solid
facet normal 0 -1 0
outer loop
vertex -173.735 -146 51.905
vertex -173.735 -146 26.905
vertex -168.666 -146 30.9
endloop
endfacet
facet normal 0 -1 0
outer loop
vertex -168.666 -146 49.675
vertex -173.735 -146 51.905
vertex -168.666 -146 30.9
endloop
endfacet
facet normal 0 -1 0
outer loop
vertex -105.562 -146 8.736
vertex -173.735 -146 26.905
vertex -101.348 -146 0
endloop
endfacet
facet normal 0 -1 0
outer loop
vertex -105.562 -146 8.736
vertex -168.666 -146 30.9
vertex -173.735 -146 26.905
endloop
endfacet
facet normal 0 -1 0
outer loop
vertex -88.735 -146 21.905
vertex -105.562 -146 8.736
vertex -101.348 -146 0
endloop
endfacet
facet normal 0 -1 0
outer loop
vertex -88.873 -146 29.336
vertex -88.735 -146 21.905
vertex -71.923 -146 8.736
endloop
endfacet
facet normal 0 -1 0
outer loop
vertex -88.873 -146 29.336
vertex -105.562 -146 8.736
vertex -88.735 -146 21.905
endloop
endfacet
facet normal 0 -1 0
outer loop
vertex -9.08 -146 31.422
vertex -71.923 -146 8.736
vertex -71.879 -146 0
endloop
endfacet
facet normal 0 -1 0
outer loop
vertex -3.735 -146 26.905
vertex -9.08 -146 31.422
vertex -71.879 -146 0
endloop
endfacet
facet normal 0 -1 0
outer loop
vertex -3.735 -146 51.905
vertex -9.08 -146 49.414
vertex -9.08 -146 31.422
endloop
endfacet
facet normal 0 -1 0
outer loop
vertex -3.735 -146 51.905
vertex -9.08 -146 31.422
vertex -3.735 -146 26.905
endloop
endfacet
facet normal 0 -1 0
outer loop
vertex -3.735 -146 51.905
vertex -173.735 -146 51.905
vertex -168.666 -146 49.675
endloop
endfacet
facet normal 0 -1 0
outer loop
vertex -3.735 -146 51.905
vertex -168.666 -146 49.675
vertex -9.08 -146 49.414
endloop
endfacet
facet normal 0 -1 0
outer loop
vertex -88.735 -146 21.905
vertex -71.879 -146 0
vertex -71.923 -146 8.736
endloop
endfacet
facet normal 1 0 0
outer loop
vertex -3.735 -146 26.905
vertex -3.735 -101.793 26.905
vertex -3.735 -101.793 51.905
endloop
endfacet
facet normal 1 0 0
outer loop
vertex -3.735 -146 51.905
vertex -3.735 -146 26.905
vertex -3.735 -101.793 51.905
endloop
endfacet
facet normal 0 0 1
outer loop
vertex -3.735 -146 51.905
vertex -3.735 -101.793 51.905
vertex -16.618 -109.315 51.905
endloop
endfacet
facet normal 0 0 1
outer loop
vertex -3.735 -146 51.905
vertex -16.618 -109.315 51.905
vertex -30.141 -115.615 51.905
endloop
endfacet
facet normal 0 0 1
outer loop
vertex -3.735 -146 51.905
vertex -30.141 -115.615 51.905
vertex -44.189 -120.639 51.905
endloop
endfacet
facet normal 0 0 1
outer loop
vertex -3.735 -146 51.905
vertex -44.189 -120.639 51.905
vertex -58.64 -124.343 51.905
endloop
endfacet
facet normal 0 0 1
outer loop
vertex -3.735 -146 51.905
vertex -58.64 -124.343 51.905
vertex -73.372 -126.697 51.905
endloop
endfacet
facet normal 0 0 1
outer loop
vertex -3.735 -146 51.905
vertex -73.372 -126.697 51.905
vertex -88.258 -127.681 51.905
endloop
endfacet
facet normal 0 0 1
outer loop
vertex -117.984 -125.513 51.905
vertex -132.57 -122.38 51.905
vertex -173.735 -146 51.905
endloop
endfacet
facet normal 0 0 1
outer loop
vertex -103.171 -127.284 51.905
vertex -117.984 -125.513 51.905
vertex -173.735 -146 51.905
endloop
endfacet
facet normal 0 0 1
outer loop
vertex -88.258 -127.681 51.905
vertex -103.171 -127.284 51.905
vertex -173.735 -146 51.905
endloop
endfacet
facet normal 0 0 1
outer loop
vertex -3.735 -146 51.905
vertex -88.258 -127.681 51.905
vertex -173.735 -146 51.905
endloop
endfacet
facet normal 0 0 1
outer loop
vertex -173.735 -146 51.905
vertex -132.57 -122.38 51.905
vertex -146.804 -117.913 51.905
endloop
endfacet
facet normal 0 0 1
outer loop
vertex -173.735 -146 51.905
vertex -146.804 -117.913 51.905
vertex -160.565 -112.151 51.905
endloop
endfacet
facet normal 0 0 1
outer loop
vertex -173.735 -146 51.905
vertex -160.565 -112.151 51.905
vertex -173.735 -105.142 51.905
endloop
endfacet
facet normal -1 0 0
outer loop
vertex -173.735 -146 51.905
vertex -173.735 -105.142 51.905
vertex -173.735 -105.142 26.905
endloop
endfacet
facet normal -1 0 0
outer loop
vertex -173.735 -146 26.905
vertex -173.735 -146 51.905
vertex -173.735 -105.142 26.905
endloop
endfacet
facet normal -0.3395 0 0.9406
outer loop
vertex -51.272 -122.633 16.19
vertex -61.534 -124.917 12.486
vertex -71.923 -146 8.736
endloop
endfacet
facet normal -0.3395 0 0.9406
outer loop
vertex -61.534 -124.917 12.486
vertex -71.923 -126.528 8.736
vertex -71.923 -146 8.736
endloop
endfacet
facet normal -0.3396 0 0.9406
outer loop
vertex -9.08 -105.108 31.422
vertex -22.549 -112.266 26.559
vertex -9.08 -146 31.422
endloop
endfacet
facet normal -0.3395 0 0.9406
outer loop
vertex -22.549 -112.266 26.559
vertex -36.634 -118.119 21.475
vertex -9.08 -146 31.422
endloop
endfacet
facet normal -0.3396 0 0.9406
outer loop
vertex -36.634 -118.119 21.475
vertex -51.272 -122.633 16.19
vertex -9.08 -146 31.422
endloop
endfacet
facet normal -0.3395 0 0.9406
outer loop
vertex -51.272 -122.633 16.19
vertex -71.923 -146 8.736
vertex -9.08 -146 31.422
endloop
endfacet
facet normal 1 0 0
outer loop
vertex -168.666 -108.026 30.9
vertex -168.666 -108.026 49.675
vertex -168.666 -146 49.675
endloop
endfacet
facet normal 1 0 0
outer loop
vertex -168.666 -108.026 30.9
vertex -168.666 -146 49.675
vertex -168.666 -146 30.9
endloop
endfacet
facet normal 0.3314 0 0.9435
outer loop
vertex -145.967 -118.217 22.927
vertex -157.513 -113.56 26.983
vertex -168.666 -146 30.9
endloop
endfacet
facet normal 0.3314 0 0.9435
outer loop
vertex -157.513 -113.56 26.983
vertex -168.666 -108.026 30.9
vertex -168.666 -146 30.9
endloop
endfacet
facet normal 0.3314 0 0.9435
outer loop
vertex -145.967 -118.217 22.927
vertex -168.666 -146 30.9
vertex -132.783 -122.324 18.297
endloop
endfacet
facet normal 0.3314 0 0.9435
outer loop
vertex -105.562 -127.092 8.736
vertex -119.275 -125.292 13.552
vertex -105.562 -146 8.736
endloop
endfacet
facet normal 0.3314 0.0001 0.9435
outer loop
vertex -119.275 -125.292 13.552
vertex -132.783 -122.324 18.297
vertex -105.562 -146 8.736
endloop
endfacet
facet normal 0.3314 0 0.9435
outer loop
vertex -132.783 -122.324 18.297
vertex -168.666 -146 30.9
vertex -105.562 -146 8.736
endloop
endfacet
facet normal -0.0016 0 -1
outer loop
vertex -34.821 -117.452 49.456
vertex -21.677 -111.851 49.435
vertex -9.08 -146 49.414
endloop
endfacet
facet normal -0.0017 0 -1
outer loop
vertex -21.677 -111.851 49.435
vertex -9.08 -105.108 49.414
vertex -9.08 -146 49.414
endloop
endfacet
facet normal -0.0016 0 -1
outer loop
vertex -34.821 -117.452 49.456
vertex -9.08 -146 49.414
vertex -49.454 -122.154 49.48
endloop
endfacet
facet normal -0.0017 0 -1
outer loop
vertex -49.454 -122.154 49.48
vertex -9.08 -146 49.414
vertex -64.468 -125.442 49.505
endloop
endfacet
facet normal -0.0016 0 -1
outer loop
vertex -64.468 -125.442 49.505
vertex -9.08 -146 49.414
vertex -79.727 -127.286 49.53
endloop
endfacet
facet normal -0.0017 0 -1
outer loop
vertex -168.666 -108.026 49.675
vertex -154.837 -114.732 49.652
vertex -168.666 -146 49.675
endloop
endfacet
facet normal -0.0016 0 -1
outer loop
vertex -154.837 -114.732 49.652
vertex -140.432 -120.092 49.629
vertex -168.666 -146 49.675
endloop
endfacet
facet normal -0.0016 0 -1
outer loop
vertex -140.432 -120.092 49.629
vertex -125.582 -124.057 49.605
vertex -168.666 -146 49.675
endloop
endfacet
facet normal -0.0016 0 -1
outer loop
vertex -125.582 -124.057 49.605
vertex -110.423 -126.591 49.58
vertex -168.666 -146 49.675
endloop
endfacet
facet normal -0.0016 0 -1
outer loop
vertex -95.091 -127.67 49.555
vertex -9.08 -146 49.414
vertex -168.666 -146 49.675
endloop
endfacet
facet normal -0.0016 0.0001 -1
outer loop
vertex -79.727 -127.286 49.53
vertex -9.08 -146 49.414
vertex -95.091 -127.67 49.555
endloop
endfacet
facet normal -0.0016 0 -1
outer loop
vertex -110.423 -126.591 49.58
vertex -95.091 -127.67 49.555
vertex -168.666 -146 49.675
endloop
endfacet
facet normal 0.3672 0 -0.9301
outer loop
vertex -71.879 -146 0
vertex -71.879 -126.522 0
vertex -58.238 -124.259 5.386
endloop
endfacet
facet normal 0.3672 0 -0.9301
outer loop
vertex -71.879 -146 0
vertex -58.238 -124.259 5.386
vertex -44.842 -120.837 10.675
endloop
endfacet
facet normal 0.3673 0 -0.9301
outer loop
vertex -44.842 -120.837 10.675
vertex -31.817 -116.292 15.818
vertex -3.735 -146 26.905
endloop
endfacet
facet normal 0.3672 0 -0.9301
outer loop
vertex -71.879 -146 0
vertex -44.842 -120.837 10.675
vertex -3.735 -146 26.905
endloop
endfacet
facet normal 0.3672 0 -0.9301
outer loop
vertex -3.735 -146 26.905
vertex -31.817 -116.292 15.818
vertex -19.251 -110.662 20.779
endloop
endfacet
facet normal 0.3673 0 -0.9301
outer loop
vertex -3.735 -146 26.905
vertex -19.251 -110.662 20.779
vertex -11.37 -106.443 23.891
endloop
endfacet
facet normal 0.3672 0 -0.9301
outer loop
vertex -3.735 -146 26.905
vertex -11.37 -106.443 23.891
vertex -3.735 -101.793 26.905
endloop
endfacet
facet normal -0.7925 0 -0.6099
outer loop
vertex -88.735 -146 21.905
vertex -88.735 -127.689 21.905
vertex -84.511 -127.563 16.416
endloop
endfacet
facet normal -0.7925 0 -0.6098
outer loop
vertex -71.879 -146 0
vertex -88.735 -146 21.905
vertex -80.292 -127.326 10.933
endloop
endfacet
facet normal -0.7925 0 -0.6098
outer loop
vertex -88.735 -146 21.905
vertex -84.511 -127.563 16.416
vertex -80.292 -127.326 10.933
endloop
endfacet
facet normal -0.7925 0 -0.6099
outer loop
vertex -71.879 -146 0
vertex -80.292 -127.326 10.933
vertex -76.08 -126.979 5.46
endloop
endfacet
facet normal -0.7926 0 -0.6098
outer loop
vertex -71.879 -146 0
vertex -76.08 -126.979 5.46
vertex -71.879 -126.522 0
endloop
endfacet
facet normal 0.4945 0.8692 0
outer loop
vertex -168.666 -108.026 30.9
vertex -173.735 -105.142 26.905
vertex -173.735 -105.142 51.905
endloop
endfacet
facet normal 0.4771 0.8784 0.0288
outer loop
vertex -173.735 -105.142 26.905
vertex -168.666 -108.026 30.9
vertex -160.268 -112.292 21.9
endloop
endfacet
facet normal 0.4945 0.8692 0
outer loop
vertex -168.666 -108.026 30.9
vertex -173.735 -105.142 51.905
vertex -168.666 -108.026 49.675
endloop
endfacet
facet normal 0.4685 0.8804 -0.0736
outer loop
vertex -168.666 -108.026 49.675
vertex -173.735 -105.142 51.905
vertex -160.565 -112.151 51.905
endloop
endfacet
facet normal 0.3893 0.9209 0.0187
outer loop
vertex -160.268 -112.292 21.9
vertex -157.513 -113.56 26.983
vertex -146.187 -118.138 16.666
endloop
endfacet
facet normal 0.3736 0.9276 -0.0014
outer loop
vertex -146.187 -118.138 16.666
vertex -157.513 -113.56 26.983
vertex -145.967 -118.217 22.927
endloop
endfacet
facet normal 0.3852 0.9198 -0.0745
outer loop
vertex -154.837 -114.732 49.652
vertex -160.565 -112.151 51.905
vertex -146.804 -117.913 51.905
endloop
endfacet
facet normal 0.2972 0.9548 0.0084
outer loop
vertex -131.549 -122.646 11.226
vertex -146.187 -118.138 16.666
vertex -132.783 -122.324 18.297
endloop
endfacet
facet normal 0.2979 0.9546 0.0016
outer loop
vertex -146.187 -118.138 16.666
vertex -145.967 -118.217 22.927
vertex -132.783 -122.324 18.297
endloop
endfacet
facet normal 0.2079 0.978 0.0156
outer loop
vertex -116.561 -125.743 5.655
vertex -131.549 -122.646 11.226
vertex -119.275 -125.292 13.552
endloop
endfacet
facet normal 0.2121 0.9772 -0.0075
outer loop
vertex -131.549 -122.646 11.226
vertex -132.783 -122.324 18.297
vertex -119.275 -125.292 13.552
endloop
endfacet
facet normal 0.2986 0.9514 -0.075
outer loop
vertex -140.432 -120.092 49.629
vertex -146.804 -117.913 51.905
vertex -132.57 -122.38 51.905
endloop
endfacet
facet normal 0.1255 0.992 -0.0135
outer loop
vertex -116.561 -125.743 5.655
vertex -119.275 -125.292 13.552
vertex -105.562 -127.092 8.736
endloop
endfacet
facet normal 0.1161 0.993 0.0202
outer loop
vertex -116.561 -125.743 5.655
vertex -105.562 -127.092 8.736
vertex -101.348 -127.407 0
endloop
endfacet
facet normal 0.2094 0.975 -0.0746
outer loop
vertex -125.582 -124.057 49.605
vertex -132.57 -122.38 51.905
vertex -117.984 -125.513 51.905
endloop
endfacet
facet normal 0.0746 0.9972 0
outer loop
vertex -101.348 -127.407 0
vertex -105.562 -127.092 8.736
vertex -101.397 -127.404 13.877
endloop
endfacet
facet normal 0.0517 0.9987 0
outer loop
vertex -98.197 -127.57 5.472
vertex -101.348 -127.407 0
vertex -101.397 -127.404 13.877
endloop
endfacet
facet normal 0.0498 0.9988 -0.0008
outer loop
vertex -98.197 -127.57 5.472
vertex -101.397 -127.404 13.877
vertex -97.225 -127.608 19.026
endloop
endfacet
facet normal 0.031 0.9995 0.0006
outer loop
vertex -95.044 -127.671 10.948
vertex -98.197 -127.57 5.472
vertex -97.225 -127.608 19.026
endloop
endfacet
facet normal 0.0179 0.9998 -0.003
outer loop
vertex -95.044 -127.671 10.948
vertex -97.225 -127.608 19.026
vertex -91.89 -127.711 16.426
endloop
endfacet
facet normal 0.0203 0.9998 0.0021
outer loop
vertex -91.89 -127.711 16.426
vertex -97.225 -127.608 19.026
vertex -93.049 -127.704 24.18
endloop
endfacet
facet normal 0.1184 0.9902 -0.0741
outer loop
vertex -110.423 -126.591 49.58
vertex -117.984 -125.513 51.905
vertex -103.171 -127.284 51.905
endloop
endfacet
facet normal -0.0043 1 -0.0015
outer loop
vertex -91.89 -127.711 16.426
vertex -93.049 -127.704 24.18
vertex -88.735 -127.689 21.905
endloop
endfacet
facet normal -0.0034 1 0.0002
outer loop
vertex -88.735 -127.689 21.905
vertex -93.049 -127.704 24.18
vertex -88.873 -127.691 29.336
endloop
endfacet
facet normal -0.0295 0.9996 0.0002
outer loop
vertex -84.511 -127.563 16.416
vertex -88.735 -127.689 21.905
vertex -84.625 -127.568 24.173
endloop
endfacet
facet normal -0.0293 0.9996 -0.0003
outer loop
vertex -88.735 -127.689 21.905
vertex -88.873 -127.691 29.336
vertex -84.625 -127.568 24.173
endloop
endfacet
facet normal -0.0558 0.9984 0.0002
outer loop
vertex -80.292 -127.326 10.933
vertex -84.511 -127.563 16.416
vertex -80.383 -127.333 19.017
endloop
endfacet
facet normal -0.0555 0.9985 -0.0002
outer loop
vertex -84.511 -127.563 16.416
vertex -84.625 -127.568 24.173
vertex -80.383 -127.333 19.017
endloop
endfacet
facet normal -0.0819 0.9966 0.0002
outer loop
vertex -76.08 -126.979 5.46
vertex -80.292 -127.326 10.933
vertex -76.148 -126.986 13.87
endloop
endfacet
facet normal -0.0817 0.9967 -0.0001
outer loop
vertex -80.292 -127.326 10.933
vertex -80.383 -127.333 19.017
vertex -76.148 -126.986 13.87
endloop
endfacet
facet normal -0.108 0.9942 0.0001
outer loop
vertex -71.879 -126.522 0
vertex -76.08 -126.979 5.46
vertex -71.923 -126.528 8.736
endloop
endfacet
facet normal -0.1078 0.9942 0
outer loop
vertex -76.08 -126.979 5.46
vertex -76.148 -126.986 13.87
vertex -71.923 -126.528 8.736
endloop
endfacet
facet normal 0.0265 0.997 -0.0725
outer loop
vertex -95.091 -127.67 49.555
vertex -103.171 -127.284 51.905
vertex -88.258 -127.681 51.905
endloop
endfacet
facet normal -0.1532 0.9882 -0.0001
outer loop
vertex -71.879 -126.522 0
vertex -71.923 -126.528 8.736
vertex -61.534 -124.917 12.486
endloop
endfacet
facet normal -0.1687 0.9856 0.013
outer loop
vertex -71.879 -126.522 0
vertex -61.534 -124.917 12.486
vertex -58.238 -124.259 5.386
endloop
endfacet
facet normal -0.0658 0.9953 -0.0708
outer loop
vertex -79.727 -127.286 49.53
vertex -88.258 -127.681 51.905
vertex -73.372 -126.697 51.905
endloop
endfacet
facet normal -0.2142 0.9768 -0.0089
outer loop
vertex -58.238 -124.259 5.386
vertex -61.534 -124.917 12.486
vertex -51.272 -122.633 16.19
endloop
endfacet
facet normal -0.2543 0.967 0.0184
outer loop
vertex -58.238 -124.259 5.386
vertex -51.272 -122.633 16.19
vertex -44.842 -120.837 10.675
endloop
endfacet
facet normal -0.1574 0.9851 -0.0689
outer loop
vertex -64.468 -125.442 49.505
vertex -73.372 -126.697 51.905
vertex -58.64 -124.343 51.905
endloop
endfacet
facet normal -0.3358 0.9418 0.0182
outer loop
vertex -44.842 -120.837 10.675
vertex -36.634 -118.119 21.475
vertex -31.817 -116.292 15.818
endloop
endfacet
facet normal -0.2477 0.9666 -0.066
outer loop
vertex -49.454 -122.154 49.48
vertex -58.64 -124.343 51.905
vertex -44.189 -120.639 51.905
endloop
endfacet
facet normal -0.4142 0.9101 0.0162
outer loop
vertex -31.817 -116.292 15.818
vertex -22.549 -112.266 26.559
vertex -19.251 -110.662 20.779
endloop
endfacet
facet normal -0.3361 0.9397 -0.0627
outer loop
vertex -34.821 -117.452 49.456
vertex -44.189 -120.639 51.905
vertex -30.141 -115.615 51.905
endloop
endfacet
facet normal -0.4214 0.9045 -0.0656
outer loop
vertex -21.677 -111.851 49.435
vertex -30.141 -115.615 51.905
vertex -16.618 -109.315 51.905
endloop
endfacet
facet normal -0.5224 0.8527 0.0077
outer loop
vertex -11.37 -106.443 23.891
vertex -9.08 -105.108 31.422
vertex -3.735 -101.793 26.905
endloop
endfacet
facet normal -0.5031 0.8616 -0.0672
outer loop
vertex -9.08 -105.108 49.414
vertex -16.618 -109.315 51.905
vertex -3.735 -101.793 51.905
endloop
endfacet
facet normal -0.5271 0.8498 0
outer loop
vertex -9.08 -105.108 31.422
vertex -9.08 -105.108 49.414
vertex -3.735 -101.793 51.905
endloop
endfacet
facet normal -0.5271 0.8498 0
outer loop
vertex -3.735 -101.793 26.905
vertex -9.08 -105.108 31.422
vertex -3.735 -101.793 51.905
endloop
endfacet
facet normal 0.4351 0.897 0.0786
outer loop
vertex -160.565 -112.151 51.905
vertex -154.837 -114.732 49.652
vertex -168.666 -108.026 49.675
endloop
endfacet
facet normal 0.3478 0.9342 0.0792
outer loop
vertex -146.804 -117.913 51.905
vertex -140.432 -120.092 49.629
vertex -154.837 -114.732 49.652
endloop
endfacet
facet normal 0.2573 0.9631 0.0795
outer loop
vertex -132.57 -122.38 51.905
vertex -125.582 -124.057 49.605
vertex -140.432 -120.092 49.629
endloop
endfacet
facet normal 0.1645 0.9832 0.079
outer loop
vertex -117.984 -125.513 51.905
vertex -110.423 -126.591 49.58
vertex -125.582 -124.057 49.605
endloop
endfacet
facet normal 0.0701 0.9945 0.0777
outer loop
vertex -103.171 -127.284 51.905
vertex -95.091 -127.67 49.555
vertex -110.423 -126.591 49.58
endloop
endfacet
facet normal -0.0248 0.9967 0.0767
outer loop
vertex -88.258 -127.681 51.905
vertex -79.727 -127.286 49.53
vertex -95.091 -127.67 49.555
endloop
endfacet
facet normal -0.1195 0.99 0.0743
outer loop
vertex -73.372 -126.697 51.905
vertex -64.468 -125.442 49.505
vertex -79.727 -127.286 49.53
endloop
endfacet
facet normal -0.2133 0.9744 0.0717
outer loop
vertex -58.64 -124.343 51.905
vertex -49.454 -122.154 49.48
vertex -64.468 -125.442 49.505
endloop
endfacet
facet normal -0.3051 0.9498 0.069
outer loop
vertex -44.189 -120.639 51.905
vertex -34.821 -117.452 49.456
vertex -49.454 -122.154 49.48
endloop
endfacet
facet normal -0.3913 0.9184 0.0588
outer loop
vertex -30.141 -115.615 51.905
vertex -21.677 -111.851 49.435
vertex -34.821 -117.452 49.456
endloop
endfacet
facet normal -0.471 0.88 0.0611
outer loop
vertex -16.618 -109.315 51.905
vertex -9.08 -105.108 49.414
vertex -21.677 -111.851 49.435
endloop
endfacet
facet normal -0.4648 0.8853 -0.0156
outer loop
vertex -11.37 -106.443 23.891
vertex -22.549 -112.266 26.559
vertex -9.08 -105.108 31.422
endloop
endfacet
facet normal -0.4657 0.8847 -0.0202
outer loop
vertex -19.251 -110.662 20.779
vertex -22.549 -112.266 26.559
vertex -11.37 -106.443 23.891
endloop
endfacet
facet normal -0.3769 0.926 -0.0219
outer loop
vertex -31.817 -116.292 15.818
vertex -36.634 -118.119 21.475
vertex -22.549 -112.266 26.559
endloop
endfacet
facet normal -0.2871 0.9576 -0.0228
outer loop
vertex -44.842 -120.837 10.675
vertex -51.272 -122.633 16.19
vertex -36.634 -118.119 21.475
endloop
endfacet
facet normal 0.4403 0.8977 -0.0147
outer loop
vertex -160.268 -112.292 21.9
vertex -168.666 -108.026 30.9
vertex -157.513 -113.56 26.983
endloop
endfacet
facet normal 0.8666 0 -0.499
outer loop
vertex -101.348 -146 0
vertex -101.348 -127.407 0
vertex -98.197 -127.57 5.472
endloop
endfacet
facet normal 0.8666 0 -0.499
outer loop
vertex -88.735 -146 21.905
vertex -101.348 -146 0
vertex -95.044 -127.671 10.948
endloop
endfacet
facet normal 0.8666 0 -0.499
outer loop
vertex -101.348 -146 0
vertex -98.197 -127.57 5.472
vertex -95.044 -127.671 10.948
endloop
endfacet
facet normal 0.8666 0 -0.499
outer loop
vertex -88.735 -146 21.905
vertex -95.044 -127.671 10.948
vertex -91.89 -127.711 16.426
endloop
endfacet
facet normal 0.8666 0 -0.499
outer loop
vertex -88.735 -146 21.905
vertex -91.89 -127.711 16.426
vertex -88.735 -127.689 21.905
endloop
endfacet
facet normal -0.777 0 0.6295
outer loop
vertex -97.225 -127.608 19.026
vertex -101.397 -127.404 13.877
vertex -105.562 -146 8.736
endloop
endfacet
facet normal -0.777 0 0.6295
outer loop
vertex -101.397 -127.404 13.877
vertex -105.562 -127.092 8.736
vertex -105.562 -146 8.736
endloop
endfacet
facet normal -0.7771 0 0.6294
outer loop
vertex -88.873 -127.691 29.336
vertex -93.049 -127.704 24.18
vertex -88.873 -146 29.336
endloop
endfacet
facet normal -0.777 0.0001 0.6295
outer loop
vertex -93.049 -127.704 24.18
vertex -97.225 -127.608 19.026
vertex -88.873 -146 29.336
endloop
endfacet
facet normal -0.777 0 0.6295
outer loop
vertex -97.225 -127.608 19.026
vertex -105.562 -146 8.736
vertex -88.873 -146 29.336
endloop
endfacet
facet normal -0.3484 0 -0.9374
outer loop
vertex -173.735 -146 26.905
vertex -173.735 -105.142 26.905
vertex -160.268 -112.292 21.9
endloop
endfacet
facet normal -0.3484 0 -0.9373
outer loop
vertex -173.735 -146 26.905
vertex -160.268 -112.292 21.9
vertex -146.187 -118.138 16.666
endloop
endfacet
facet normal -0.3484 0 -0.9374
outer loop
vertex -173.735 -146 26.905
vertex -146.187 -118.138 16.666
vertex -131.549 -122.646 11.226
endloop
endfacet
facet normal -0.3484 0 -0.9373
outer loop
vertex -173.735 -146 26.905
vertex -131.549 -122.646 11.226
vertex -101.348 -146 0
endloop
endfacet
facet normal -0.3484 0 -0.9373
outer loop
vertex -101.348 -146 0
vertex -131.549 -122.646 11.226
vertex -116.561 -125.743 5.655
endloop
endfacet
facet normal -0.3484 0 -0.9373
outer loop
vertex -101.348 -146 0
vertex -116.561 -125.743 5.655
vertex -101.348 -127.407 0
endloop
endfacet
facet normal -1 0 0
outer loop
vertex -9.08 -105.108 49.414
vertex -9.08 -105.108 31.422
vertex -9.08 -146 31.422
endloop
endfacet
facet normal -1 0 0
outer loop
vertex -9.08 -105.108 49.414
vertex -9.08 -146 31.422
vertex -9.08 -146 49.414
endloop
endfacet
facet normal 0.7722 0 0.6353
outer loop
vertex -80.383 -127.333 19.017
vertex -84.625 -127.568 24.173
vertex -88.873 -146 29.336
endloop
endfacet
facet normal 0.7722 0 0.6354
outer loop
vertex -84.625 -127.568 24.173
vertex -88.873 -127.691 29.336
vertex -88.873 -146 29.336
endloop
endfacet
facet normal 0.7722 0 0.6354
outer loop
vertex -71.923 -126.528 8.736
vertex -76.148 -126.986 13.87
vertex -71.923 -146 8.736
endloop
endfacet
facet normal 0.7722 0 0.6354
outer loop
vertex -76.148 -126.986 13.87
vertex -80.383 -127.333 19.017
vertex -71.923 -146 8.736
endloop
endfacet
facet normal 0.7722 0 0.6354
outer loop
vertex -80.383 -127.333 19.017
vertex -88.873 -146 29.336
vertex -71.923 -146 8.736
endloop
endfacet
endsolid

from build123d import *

# Parameters (mm, degrees)
F1_DEPTH = 146
F3_DEPTH = 60
F5_DEPTH = 500


with BuildPart() as f1:
    # F0 (on Front) → F1 (new body)
    with BuildSketch(Plane.XZ):
        Polygon((-3.734913, 26.905388), (-3.734913, 51.905388), (-88.734913, 51.905388), (-173.734913, 51.905388), (-173.734913, 26.905388), (-101.347528, 0), (-88.734913, 21.905388), (-71.878783, 0), align=None)
    extrude(amount=F1_DEPTH)

    # F2 (on face) → F3 (cut)
    with BuildSketch(Plane.XY.offset(51.905388)):
        with BuildLine():
            Line((-173.734913, 0), (-173.734913, -105.142423))
            ThreePointArc((-173.734913, -105.142423), (-88.257826, -127.680535), (-3.734913, -101.792774))
            Line((-3.734913, -101.792774), (-3.734913, 0))
            Line((-3.734913, 0), (-173.734913, 0))
        make_face()
    extrude(amount=-F3_DEPTH, mode=Mode.SUBTRACT)

    # F4 (on face) → F5 (cut)
    with BuildSketch(Plane.XZ.offset(146)):
        Polygon((-9.079793, 49.414322), (-168.665886, 49.675085), (-168.665886, 30.900249), (-105.561584, 8.735513), (-88.872842, 29.335679), (-71.923338, 8.735513), (-9.079793, 31.421773), align=None)
    extrude(amount=-F5_DEPTH, mode=Mode.SUBTRACT)


solid = f1.part
